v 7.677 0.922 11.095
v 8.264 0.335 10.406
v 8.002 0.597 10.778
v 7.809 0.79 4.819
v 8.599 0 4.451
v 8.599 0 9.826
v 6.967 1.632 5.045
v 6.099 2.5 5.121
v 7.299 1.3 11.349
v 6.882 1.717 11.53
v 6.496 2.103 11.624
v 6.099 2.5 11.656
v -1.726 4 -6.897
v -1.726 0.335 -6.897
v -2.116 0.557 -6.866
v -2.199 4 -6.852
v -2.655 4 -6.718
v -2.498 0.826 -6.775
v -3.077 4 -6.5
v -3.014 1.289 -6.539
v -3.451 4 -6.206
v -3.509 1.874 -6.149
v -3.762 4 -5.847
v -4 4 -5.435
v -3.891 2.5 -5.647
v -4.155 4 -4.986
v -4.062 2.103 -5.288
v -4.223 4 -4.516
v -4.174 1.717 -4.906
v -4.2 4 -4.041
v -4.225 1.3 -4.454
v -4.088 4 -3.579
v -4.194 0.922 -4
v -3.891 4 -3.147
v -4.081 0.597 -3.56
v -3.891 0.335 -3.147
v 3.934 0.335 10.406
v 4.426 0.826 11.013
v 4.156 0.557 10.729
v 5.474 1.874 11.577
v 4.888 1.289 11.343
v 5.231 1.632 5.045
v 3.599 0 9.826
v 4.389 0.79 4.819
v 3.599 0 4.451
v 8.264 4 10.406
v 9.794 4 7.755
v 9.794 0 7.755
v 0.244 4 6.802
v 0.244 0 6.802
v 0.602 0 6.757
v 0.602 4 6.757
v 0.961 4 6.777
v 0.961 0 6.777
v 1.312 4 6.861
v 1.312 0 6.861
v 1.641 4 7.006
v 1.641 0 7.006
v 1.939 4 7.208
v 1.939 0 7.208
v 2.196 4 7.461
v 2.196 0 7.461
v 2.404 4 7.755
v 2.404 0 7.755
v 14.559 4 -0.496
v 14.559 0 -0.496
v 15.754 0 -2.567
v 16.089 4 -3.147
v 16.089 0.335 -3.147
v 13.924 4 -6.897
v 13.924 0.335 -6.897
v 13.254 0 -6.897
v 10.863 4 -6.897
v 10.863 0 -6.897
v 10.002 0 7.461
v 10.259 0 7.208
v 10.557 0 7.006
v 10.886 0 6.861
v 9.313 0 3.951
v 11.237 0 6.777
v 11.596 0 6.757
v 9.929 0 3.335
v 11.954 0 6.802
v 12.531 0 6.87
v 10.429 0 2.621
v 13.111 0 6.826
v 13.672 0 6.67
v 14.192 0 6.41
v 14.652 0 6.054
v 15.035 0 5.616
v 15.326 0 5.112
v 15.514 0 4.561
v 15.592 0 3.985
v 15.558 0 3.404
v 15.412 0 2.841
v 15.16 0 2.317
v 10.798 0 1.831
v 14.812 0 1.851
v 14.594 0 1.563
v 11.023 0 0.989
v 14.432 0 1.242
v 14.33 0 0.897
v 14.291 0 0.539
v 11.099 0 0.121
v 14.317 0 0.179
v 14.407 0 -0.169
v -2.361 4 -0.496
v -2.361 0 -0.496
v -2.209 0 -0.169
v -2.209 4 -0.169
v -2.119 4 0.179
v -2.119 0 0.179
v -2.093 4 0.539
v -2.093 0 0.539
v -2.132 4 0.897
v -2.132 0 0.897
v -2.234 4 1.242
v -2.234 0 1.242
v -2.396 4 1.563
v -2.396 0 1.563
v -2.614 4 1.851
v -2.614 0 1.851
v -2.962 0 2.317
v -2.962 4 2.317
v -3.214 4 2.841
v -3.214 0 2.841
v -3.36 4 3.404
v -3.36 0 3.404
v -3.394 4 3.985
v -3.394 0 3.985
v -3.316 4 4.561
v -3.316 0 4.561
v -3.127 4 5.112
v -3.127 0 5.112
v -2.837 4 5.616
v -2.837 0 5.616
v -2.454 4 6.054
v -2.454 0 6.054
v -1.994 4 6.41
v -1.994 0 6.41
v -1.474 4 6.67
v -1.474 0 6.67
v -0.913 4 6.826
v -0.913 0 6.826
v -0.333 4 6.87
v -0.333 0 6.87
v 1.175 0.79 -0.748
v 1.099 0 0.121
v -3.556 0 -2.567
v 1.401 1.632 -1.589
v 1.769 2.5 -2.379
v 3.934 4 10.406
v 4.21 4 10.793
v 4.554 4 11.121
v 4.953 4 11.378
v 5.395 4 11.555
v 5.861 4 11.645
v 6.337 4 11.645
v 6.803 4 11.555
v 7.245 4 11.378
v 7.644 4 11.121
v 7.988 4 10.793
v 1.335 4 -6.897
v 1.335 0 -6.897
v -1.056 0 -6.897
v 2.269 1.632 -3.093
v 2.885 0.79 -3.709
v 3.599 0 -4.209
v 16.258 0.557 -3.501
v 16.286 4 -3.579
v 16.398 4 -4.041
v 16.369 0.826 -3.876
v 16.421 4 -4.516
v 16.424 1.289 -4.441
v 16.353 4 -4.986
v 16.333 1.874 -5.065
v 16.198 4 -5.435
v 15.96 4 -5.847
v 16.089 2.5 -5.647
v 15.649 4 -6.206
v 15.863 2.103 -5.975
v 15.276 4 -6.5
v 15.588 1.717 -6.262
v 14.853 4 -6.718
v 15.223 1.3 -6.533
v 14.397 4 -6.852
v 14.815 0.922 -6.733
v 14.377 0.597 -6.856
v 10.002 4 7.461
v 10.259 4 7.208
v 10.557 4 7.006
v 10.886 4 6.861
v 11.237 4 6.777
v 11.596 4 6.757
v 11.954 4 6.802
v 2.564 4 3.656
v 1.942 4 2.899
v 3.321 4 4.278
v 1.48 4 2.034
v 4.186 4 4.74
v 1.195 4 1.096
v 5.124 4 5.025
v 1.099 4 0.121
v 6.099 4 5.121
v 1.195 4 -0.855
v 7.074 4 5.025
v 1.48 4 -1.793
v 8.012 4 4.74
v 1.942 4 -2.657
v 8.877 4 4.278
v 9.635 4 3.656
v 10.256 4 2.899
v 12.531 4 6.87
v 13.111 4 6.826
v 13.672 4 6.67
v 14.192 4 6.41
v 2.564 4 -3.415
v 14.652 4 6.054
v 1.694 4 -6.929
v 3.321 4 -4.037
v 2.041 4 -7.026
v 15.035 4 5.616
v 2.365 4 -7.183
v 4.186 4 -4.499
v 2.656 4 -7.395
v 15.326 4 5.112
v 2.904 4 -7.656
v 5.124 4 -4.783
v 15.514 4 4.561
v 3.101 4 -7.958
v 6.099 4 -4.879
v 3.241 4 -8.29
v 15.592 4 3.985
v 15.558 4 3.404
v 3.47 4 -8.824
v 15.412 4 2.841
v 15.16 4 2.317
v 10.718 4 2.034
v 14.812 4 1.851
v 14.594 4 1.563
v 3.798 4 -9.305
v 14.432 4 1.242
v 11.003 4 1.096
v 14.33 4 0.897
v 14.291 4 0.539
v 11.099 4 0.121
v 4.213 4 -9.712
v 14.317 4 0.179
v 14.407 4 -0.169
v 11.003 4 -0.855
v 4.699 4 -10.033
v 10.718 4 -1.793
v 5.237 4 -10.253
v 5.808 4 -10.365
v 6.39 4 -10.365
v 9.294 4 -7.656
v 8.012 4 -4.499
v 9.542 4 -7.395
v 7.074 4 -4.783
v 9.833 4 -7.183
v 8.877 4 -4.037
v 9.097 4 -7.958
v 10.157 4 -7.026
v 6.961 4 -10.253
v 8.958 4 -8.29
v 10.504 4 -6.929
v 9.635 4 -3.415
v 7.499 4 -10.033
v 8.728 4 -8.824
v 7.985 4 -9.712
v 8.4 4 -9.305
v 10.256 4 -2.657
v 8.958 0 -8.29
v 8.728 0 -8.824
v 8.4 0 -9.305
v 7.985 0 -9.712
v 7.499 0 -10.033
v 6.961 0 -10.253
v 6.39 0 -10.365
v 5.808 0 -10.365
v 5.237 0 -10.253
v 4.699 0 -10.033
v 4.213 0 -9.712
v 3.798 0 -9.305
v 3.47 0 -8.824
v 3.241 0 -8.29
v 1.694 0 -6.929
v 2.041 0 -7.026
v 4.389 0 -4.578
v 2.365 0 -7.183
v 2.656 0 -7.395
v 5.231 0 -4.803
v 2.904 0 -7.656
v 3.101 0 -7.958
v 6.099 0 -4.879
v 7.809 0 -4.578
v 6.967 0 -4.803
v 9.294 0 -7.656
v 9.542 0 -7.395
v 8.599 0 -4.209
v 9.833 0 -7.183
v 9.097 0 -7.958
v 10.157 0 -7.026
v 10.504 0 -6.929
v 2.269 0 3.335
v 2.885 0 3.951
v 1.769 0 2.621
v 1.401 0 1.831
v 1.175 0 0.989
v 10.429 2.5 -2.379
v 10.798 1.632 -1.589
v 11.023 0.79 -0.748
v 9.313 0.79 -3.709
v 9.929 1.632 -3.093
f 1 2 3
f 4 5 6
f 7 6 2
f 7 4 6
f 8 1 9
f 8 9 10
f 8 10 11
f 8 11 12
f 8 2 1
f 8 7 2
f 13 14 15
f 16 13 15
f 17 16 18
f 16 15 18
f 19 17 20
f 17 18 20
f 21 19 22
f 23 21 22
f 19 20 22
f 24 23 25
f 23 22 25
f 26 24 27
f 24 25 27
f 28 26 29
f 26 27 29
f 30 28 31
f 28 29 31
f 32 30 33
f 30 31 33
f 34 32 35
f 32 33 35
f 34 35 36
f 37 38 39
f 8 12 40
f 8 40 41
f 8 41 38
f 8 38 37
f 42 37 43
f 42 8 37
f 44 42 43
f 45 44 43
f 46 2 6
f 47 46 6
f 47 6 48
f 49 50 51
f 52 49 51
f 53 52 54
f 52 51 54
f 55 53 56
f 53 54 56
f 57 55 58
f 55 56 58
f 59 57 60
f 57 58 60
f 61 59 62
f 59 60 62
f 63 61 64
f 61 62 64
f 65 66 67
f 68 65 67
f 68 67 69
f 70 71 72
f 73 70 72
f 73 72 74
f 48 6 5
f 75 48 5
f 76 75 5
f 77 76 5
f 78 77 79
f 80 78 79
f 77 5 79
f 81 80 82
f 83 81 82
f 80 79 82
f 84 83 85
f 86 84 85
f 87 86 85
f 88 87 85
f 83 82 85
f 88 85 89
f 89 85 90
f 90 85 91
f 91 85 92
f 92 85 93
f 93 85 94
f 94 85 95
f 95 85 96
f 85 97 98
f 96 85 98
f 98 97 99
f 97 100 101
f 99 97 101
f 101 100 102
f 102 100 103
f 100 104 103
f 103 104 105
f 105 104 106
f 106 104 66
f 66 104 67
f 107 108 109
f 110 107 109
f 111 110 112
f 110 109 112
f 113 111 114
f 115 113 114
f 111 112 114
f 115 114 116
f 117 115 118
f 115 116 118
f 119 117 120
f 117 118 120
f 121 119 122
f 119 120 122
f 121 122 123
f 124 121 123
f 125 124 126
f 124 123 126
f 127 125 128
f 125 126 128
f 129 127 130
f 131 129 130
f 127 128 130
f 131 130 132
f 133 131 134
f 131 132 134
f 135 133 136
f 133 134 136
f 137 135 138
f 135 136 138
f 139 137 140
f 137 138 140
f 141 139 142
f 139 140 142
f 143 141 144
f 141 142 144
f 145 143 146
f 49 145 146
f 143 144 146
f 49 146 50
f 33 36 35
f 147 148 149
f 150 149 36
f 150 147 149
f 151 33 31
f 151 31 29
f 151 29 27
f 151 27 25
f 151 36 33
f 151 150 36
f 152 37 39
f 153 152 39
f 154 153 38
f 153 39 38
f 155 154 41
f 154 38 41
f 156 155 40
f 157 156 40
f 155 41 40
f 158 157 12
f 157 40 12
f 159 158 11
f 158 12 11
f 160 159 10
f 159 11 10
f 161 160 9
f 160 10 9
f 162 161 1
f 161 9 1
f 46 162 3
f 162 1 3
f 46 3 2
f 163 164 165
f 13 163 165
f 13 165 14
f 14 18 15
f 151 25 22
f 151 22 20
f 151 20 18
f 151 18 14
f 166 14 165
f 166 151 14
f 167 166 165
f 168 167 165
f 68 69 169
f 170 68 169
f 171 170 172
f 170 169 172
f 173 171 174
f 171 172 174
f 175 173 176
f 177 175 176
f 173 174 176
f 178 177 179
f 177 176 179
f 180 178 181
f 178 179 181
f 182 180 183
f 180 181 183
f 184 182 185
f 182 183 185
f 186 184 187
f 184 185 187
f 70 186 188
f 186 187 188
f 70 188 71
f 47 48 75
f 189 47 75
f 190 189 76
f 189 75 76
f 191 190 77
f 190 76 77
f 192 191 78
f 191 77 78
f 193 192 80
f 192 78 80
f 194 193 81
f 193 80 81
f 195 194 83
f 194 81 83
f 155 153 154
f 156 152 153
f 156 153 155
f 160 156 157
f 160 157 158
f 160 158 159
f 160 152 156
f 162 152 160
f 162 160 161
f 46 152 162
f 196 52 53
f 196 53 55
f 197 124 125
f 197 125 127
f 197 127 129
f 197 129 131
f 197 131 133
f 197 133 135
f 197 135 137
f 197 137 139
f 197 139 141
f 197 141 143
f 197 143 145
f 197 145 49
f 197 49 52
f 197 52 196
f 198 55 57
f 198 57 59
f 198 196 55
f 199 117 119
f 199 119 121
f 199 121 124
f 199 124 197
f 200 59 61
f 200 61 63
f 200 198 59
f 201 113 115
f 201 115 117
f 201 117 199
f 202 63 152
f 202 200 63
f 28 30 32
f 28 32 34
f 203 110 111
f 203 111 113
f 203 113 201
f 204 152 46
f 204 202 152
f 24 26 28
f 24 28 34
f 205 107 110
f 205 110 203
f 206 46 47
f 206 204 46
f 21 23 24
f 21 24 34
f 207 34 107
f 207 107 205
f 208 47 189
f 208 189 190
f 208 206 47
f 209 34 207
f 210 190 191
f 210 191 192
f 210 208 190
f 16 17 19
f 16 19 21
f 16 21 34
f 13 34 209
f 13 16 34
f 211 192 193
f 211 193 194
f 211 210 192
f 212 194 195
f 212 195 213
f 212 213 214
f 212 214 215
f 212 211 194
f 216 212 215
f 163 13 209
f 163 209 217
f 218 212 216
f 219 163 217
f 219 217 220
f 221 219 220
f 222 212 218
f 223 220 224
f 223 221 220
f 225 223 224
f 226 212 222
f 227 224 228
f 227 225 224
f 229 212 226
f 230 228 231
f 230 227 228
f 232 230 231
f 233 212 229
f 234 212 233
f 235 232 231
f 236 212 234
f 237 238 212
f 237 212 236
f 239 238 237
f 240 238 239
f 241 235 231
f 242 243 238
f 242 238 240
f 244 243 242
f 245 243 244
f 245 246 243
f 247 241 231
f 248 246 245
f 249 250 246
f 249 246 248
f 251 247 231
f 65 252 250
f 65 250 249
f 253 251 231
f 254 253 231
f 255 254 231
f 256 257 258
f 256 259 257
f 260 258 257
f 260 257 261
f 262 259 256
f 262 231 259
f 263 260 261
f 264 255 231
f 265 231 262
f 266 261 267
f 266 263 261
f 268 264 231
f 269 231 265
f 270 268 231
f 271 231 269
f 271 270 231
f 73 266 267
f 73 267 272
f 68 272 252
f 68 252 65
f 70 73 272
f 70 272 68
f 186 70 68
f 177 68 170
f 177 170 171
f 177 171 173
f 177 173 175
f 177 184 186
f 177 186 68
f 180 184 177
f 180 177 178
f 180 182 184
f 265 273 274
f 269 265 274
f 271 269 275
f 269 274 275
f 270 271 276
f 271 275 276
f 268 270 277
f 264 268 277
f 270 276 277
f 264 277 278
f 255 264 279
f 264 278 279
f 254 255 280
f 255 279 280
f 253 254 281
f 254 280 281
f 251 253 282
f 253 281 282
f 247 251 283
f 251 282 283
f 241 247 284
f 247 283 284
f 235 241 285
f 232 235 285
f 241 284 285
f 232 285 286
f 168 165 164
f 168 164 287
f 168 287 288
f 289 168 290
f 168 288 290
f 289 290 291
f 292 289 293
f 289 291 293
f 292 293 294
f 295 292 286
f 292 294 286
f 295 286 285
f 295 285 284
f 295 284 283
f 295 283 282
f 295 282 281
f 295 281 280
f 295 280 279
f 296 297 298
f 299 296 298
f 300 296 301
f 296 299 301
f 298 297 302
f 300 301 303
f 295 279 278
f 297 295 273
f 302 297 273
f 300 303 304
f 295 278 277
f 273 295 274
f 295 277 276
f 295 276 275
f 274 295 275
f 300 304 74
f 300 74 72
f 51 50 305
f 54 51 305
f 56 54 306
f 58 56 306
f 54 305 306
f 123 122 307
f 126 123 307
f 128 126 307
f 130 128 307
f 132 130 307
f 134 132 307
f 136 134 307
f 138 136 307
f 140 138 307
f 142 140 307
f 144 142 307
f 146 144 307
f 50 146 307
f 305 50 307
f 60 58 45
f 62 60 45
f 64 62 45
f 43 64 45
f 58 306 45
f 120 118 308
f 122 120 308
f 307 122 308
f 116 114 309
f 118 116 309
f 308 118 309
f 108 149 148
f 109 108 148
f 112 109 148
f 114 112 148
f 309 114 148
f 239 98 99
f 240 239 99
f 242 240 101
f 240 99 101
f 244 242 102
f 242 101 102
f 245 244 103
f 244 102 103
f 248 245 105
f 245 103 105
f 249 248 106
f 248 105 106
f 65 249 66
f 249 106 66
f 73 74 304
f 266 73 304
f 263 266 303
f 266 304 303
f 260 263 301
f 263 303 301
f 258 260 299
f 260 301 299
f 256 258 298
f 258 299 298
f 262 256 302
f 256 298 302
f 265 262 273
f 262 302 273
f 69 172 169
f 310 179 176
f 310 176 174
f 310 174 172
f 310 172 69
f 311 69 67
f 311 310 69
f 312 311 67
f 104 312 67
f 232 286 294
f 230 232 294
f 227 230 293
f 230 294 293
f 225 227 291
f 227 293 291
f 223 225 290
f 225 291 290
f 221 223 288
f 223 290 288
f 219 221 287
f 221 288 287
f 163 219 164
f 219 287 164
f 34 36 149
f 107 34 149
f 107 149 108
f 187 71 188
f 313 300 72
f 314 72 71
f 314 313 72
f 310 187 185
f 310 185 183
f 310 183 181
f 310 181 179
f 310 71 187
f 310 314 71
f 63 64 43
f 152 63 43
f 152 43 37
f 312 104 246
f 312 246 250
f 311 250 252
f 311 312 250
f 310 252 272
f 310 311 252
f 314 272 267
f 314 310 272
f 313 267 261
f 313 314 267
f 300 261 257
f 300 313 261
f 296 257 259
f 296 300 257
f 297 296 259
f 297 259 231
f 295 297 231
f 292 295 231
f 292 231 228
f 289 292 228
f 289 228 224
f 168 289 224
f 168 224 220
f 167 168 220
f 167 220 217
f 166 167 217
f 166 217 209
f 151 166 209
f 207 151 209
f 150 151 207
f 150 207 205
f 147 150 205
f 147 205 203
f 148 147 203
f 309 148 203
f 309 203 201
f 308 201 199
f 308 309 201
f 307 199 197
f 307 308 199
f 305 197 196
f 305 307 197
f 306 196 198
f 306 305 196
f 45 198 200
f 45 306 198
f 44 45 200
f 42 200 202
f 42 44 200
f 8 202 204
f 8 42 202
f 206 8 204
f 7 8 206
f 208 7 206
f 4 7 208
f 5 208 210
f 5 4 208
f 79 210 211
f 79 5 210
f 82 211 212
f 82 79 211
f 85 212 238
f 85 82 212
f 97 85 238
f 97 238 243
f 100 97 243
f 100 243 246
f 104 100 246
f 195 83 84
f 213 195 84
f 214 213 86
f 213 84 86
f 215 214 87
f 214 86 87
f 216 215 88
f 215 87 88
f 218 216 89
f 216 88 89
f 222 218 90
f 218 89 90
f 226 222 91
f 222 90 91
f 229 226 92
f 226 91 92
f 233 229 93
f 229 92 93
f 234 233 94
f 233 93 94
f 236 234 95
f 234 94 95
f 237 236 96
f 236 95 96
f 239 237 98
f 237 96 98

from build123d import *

# Parameters (mm, degrees)
SKETCH1_R      = 5
EXTRUDE1_DEPTH = 4
EXTRUDE4_START = 4.45086
EXTRUDE4_DEPTH = 7.205259
EXTRUDE5_START = 4.330127
EXTRUDE5_DEPTH = 7.205258
EXTRUDE6_START = 4.330127
EXTRUDE6_DEPTH = 7.205258


with BuildPart() as part:
    # Sketch1 → Extrude1 (new body)
    with BuildSketch(Plane(origin=(0, 0, 0), x_dir=(1, 0, 0), z_dir=(0, 1, 0))):
        with BuildLine():
            Line((-3.89089061, 3.146959138), (-2.360502052, 0.4962484))
            ThreePointArc((-2.360502052, 0.4962484), (-2.104118872, -0.718531203), (-2.613989574, -1.850544314))
            ThreePointArc((-2.613989574, -1.850544314), (-2.994220859, -5.370733384), (0.244467944, -6.801537968))
            ThreePointArc((0.244467944, -6.801537968), (1.479755407, -6.925983542), (2.403593813, -7.75540769))
            Line((2.403593813, -7.75540769), (3.933982371, -10.406118428))
            ThreePointArc((3.933982371, -10.406118428), (6.099045881, -11.656118428), (8.26410939, -10.406118428))
            Line((8.26410939, -10.406118428), (9.794497948, -7.75540769))
            ThreePointArc((9.794497948, -7.75540769), (10.718336354, -6.925983542), (11.953623817, -6.801537968))
            ThreePointArc((11.953623817, -6.801537968), (15.192312621, -5.370733384), (14.812081336, -1.850544314))
            ThreePointArc((14.812081336, -1.850544314), (14.302210633, -0.718531203), (14.558593813, 0.4962484))
            Line((14.558593813, 0.4962484), (16.088982371, 3.146959138))
            ThreePointArc((16.088982371, 3.146959138), (16.088982371, 5.646959138), (13.923918862, 6.896959138))
            Line((13.923918862, 6.896959138), (10.863141746, 6.896959138))
            ThreePointArc((10.863141746, 6.896959138), (9.68292016, 7.282314592), (8.9575034, 8.289882129))
            ThreePointArc((8.9575034, 8.289882129), (6.099045881, 10.379266616), (3.240588362, 8.289882129))
            ThreePointArc((3.240588362, 8.289882129), (2.515171602, 7.282314592), (1.334950016, 6.896959138))
            Line((1.334950016, 6.896959138), (-1.7258271, 6.896959138))
            ThreePointArc((-1.7258271, 6.896959138), (-3.89089061, 5.646959138), (-3.89089061, 3.146959138))
        make_face()
        with Locations((6.099045881, -0.120733384)):
            Circle(SKETCH1_R, mode=Mode.SUBTRACT)
    extrude(amount=EXTRUDE1_DEPTH)

    # GrooveSketch → Extrude4 (cut)
    with BuildSketch(Plane.XY.offset(EXTRUDE4_START)):
        Polygon((34.668922444, -26.069876563), (8.599045881, 0), (6.099045881, 2.5), (3.599045881, 0), (-22.470830682, -26.069876563), (-22.470830682, -99.806622573), (34.668922444, -99.806622573), align=None)
    extrude(amount=EXTRUDE4_DEPTH, mode=Mode.SUBTRACT)

    # Sketch9 → Extrude5 (cut)
    with BuildSketch(Plane(origin=(4.6265635, 0, 2.671147682), x_dir=(-0.5, 0, 0.866025404), z_dir=(-0.866025404, 0, -0.5)).offset(EXTRUDE5_START)):
        Polygon((32.223222882, -32.668187644), (-0.444964763, 0), (-2.944964763, 2.5), (-5.444964763, 0), (-38.113152407, -32.668187644), (-38.113152407, -125.067775694), (32.223222882, -125.067775694), align=None)
    extrude(amount=EXTRUDE5_DEPTH, mode=Mode.SUBTRACT)

    # Sketch10 → Extrude6 (cut)
    with BuildSketch(Plane(origin=(4.522005322, 0, -2.61078099), x_dir=(-0.5, 0, -0.866025404), z_dir=(0.866025404, 0, -0.5)).offset(EXTRUDE6_START)):
        Polygon((32.014106526, -32.668187644), (-0.654081118, 0), (-3.154081118, 2.5), (-5.654081118, 0), (-38.322268763, -32.668187644), (-38.322268763, -125.067775694), (32.014106526, -125.067775694), align=None)
    extrude(amount=EXTRUDE6_DEPTH, mode=Mode.SUBTRACT)


solid = part.part
